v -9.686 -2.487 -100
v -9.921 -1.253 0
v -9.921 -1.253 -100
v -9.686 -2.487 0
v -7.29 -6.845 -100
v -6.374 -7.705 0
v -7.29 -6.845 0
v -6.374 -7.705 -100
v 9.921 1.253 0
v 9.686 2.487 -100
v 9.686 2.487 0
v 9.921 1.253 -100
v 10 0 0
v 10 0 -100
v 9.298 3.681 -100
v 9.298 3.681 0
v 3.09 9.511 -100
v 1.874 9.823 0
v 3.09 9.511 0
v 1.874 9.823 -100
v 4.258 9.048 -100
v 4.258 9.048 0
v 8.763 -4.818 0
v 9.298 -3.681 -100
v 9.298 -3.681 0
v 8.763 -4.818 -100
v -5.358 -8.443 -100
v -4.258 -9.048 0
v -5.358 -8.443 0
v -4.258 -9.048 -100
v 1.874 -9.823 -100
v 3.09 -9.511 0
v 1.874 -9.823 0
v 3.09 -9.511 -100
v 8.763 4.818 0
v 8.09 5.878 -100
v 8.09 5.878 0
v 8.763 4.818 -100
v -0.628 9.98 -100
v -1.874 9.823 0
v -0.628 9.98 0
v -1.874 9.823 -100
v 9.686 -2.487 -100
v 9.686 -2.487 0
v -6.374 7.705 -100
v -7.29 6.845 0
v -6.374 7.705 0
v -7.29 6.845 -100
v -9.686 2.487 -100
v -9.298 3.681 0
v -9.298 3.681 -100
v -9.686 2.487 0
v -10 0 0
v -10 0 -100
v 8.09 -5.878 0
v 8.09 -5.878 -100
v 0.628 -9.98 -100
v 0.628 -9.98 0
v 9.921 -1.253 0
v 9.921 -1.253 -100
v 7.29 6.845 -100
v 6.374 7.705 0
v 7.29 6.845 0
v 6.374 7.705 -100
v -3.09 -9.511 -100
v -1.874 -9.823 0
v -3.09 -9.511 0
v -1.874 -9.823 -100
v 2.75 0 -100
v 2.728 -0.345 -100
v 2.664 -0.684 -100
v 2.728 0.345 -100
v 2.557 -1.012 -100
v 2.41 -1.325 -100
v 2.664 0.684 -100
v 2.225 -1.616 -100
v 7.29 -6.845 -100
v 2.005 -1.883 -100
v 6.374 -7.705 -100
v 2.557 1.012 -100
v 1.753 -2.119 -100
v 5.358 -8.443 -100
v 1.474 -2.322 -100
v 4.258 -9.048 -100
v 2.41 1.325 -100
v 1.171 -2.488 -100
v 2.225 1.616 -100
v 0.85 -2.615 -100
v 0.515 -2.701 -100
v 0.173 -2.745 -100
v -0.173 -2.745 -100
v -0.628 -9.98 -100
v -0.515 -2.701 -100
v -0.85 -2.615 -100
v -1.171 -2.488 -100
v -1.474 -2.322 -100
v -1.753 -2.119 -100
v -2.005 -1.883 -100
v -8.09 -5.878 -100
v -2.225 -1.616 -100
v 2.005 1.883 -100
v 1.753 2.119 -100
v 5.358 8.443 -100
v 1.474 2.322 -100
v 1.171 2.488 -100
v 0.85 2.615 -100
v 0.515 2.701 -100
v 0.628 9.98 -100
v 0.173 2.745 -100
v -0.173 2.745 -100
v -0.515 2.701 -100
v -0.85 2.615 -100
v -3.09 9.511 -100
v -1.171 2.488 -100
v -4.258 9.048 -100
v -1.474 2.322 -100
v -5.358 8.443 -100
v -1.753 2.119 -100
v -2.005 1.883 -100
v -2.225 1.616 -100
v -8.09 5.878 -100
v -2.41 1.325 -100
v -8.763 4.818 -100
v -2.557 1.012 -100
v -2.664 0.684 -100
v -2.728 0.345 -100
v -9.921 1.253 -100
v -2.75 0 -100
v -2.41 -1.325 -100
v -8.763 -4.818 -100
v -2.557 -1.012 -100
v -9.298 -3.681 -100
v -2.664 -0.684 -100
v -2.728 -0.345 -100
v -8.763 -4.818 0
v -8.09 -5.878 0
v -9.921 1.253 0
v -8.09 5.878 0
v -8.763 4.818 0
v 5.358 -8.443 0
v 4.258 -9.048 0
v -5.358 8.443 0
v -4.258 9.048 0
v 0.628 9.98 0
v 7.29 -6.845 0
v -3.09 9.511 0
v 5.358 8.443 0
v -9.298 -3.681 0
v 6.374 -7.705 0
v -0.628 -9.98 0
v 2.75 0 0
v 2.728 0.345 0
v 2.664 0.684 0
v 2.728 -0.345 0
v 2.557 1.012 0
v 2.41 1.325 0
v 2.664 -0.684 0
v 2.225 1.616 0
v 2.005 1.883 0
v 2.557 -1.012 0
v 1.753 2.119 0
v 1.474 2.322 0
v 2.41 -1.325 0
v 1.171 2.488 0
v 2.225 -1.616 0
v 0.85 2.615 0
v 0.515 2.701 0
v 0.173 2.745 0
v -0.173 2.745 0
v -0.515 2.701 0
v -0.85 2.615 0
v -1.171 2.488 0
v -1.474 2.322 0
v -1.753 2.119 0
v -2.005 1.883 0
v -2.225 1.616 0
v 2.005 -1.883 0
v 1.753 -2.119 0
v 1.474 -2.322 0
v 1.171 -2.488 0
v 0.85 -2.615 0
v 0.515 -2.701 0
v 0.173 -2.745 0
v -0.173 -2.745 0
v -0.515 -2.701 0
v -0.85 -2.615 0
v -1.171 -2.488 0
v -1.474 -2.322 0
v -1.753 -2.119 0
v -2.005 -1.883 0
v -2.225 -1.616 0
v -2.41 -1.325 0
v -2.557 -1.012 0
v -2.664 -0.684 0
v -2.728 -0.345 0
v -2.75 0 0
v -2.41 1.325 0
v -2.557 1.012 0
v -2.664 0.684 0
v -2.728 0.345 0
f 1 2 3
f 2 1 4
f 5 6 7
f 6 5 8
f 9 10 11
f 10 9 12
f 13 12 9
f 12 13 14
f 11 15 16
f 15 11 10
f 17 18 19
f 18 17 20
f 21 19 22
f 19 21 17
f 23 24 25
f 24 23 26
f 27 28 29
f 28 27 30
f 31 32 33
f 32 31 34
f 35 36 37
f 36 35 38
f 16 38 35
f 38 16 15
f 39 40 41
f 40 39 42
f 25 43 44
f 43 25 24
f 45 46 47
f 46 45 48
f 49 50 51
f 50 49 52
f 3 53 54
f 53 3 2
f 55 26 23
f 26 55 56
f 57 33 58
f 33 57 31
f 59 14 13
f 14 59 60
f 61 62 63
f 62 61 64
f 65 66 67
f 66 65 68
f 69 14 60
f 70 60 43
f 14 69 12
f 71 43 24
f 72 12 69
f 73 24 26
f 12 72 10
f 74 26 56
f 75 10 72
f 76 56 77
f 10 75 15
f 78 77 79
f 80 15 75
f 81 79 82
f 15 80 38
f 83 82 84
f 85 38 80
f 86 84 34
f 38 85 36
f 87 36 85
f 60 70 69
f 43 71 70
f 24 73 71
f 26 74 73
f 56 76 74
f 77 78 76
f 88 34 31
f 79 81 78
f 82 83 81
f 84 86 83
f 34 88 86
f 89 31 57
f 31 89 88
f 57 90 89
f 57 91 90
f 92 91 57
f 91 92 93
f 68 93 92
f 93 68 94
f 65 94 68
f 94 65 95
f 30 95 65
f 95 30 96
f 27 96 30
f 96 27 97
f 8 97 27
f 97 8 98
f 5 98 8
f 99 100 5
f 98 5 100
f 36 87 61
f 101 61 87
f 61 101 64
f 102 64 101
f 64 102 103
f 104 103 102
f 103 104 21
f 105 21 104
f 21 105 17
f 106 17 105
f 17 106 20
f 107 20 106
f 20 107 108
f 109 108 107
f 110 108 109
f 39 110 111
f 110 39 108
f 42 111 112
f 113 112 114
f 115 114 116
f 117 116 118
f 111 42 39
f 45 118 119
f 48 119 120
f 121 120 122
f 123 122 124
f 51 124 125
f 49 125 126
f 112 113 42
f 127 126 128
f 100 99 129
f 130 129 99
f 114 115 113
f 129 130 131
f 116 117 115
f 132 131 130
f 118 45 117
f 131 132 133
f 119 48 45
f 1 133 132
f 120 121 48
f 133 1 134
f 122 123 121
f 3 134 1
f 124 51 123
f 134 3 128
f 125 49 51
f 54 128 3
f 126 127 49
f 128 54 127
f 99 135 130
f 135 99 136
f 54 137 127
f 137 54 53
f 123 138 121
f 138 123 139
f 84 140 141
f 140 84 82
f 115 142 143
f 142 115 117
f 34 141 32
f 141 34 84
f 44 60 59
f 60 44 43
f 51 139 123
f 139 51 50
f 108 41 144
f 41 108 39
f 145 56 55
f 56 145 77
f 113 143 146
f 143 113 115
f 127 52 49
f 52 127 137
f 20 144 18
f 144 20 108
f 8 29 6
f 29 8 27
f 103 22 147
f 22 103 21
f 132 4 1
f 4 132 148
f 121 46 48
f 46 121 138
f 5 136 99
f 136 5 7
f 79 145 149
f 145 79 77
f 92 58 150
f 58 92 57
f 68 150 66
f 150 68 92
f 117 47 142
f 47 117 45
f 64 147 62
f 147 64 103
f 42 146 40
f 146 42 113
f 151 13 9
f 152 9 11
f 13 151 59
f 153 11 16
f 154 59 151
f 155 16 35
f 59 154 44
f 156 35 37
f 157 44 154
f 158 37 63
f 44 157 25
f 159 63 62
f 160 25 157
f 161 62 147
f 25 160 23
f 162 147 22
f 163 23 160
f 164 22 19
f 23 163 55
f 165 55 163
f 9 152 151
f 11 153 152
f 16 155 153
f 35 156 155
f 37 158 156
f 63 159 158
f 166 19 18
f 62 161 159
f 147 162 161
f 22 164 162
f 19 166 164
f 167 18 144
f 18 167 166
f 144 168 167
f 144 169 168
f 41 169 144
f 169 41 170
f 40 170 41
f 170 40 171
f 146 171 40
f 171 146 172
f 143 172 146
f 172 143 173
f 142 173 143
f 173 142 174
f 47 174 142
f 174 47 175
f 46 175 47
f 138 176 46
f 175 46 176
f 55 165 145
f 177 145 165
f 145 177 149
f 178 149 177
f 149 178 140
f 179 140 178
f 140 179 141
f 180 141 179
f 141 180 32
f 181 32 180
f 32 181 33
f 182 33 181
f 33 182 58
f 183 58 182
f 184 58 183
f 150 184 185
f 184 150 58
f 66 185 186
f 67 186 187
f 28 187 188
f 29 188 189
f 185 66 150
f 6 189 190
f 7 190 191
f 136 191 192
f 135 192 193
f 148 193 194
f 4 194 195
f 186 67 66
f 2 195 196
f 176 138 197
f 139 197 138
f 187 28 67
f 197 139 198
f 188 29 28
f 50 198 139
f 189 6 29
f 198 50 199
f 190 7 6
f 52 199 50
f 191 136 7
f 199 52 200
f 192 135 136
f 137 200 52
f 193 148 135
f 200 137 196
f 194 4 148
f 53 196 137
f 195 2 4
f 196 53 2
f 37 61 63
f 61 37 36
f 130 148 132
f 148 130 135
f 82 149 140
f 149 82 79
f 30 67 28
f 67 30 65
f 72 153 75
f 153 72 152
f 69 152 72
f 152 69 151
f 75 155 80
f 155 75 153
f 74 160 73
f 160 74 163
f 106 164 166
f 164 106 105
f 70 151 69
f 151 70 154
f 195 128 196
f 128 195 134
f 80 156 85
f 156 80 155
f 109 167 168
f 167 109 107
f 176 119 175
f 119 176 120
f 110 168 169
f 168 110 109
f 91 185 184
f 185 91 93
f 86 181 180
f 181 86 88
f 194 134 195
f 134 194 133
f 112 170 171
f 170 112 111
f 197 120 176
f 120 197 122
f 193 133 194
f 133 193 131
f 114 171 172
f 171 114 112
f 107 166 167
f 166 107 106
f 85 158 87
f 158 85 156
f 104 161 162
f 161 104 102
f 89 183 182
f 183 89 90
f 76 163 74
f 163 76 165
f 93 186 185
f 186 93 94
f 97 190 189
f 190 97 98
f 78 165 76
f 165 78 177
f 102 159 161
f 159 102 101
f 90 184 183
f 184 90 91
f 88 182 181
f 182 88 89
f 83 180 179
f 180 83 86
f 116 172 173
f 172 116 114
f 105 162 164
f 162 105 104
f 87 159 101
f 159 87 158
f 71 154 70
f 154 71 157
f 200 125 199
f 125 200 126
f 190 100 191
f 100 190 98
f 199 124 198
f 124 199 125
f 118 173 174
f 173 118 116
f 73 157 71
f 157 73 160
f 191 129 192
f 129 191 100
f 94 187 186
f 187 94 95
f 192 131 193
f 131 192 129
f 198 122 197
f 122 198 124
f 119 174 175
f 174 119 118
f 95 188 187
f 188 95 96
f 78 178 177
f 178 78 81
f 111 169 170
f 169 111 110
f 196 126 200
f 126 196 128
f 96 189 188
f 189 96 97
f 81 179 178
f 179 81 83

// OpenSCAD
$fn = 50;


difference() {
	union() {
		translate(v = [0, 0, -100.0000000000]) {
			cylinder(h = 100, r = 10.0000000000);
		}
		cylinder(h = 0, r = 20.0000000000);
	}
	union() {
		#translate(v = [0, 0, -100]) {
			cylinder(h = 100, r = 2.7500000000);
		}
	}
}
